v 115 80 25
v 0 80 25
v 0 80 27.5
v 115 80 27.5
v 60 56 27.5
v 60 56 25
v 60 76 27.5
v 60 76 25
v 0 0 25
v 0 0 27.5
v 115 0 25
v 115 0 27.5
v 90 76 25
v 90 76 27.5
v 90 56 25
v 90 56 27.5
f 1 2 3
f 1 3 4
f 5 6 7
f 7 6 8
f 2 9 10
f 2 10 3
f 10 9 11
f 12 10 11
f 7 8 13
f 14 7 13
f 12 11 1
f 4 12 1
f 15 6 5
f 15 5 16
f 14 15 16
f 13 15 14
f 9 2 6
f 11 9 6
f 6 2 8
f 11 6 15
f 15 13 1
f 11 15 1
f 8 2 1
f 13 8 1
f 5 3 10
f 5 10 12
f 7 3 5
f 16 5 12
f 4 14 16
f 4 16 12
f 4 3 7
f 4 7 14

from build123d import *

# Parameters (mm, degrees)
BOX013_W     = 30
BOX013_H     = 20
BOX013_DEPTH = 2.5
BOX012_W     = 115
BOX012_H     = 80
BOX012_DEPTH = 2.5


with BuildPart() as cubo005:
    # Box013 → Box013 (new body)
    with BuildSketch(Plane(origin=(60, 56, 25), x_dir=(1, 0, 0), z_dir=(0, 0, 1))):
        with Locations((15, 10)):
            Rectangle(BOX013_W, BOX013_H)
    extrude(amount=BOX013_DEPTH)


with BuildPart() as cut017:
    # Box012 → Box012 (new body)
    with BuildSketch(Plane.XY.offset(25)):
        with Locations((57.5, 40)):
            Rectangle(BOX012_W, BOX012_H)
    extrude(amount=BOX012_DEPTH)

    # Cut017: cut Cubo005
    add(cubo005.part, mode=Mode.SUBTRACT)


solid = cut017.part
